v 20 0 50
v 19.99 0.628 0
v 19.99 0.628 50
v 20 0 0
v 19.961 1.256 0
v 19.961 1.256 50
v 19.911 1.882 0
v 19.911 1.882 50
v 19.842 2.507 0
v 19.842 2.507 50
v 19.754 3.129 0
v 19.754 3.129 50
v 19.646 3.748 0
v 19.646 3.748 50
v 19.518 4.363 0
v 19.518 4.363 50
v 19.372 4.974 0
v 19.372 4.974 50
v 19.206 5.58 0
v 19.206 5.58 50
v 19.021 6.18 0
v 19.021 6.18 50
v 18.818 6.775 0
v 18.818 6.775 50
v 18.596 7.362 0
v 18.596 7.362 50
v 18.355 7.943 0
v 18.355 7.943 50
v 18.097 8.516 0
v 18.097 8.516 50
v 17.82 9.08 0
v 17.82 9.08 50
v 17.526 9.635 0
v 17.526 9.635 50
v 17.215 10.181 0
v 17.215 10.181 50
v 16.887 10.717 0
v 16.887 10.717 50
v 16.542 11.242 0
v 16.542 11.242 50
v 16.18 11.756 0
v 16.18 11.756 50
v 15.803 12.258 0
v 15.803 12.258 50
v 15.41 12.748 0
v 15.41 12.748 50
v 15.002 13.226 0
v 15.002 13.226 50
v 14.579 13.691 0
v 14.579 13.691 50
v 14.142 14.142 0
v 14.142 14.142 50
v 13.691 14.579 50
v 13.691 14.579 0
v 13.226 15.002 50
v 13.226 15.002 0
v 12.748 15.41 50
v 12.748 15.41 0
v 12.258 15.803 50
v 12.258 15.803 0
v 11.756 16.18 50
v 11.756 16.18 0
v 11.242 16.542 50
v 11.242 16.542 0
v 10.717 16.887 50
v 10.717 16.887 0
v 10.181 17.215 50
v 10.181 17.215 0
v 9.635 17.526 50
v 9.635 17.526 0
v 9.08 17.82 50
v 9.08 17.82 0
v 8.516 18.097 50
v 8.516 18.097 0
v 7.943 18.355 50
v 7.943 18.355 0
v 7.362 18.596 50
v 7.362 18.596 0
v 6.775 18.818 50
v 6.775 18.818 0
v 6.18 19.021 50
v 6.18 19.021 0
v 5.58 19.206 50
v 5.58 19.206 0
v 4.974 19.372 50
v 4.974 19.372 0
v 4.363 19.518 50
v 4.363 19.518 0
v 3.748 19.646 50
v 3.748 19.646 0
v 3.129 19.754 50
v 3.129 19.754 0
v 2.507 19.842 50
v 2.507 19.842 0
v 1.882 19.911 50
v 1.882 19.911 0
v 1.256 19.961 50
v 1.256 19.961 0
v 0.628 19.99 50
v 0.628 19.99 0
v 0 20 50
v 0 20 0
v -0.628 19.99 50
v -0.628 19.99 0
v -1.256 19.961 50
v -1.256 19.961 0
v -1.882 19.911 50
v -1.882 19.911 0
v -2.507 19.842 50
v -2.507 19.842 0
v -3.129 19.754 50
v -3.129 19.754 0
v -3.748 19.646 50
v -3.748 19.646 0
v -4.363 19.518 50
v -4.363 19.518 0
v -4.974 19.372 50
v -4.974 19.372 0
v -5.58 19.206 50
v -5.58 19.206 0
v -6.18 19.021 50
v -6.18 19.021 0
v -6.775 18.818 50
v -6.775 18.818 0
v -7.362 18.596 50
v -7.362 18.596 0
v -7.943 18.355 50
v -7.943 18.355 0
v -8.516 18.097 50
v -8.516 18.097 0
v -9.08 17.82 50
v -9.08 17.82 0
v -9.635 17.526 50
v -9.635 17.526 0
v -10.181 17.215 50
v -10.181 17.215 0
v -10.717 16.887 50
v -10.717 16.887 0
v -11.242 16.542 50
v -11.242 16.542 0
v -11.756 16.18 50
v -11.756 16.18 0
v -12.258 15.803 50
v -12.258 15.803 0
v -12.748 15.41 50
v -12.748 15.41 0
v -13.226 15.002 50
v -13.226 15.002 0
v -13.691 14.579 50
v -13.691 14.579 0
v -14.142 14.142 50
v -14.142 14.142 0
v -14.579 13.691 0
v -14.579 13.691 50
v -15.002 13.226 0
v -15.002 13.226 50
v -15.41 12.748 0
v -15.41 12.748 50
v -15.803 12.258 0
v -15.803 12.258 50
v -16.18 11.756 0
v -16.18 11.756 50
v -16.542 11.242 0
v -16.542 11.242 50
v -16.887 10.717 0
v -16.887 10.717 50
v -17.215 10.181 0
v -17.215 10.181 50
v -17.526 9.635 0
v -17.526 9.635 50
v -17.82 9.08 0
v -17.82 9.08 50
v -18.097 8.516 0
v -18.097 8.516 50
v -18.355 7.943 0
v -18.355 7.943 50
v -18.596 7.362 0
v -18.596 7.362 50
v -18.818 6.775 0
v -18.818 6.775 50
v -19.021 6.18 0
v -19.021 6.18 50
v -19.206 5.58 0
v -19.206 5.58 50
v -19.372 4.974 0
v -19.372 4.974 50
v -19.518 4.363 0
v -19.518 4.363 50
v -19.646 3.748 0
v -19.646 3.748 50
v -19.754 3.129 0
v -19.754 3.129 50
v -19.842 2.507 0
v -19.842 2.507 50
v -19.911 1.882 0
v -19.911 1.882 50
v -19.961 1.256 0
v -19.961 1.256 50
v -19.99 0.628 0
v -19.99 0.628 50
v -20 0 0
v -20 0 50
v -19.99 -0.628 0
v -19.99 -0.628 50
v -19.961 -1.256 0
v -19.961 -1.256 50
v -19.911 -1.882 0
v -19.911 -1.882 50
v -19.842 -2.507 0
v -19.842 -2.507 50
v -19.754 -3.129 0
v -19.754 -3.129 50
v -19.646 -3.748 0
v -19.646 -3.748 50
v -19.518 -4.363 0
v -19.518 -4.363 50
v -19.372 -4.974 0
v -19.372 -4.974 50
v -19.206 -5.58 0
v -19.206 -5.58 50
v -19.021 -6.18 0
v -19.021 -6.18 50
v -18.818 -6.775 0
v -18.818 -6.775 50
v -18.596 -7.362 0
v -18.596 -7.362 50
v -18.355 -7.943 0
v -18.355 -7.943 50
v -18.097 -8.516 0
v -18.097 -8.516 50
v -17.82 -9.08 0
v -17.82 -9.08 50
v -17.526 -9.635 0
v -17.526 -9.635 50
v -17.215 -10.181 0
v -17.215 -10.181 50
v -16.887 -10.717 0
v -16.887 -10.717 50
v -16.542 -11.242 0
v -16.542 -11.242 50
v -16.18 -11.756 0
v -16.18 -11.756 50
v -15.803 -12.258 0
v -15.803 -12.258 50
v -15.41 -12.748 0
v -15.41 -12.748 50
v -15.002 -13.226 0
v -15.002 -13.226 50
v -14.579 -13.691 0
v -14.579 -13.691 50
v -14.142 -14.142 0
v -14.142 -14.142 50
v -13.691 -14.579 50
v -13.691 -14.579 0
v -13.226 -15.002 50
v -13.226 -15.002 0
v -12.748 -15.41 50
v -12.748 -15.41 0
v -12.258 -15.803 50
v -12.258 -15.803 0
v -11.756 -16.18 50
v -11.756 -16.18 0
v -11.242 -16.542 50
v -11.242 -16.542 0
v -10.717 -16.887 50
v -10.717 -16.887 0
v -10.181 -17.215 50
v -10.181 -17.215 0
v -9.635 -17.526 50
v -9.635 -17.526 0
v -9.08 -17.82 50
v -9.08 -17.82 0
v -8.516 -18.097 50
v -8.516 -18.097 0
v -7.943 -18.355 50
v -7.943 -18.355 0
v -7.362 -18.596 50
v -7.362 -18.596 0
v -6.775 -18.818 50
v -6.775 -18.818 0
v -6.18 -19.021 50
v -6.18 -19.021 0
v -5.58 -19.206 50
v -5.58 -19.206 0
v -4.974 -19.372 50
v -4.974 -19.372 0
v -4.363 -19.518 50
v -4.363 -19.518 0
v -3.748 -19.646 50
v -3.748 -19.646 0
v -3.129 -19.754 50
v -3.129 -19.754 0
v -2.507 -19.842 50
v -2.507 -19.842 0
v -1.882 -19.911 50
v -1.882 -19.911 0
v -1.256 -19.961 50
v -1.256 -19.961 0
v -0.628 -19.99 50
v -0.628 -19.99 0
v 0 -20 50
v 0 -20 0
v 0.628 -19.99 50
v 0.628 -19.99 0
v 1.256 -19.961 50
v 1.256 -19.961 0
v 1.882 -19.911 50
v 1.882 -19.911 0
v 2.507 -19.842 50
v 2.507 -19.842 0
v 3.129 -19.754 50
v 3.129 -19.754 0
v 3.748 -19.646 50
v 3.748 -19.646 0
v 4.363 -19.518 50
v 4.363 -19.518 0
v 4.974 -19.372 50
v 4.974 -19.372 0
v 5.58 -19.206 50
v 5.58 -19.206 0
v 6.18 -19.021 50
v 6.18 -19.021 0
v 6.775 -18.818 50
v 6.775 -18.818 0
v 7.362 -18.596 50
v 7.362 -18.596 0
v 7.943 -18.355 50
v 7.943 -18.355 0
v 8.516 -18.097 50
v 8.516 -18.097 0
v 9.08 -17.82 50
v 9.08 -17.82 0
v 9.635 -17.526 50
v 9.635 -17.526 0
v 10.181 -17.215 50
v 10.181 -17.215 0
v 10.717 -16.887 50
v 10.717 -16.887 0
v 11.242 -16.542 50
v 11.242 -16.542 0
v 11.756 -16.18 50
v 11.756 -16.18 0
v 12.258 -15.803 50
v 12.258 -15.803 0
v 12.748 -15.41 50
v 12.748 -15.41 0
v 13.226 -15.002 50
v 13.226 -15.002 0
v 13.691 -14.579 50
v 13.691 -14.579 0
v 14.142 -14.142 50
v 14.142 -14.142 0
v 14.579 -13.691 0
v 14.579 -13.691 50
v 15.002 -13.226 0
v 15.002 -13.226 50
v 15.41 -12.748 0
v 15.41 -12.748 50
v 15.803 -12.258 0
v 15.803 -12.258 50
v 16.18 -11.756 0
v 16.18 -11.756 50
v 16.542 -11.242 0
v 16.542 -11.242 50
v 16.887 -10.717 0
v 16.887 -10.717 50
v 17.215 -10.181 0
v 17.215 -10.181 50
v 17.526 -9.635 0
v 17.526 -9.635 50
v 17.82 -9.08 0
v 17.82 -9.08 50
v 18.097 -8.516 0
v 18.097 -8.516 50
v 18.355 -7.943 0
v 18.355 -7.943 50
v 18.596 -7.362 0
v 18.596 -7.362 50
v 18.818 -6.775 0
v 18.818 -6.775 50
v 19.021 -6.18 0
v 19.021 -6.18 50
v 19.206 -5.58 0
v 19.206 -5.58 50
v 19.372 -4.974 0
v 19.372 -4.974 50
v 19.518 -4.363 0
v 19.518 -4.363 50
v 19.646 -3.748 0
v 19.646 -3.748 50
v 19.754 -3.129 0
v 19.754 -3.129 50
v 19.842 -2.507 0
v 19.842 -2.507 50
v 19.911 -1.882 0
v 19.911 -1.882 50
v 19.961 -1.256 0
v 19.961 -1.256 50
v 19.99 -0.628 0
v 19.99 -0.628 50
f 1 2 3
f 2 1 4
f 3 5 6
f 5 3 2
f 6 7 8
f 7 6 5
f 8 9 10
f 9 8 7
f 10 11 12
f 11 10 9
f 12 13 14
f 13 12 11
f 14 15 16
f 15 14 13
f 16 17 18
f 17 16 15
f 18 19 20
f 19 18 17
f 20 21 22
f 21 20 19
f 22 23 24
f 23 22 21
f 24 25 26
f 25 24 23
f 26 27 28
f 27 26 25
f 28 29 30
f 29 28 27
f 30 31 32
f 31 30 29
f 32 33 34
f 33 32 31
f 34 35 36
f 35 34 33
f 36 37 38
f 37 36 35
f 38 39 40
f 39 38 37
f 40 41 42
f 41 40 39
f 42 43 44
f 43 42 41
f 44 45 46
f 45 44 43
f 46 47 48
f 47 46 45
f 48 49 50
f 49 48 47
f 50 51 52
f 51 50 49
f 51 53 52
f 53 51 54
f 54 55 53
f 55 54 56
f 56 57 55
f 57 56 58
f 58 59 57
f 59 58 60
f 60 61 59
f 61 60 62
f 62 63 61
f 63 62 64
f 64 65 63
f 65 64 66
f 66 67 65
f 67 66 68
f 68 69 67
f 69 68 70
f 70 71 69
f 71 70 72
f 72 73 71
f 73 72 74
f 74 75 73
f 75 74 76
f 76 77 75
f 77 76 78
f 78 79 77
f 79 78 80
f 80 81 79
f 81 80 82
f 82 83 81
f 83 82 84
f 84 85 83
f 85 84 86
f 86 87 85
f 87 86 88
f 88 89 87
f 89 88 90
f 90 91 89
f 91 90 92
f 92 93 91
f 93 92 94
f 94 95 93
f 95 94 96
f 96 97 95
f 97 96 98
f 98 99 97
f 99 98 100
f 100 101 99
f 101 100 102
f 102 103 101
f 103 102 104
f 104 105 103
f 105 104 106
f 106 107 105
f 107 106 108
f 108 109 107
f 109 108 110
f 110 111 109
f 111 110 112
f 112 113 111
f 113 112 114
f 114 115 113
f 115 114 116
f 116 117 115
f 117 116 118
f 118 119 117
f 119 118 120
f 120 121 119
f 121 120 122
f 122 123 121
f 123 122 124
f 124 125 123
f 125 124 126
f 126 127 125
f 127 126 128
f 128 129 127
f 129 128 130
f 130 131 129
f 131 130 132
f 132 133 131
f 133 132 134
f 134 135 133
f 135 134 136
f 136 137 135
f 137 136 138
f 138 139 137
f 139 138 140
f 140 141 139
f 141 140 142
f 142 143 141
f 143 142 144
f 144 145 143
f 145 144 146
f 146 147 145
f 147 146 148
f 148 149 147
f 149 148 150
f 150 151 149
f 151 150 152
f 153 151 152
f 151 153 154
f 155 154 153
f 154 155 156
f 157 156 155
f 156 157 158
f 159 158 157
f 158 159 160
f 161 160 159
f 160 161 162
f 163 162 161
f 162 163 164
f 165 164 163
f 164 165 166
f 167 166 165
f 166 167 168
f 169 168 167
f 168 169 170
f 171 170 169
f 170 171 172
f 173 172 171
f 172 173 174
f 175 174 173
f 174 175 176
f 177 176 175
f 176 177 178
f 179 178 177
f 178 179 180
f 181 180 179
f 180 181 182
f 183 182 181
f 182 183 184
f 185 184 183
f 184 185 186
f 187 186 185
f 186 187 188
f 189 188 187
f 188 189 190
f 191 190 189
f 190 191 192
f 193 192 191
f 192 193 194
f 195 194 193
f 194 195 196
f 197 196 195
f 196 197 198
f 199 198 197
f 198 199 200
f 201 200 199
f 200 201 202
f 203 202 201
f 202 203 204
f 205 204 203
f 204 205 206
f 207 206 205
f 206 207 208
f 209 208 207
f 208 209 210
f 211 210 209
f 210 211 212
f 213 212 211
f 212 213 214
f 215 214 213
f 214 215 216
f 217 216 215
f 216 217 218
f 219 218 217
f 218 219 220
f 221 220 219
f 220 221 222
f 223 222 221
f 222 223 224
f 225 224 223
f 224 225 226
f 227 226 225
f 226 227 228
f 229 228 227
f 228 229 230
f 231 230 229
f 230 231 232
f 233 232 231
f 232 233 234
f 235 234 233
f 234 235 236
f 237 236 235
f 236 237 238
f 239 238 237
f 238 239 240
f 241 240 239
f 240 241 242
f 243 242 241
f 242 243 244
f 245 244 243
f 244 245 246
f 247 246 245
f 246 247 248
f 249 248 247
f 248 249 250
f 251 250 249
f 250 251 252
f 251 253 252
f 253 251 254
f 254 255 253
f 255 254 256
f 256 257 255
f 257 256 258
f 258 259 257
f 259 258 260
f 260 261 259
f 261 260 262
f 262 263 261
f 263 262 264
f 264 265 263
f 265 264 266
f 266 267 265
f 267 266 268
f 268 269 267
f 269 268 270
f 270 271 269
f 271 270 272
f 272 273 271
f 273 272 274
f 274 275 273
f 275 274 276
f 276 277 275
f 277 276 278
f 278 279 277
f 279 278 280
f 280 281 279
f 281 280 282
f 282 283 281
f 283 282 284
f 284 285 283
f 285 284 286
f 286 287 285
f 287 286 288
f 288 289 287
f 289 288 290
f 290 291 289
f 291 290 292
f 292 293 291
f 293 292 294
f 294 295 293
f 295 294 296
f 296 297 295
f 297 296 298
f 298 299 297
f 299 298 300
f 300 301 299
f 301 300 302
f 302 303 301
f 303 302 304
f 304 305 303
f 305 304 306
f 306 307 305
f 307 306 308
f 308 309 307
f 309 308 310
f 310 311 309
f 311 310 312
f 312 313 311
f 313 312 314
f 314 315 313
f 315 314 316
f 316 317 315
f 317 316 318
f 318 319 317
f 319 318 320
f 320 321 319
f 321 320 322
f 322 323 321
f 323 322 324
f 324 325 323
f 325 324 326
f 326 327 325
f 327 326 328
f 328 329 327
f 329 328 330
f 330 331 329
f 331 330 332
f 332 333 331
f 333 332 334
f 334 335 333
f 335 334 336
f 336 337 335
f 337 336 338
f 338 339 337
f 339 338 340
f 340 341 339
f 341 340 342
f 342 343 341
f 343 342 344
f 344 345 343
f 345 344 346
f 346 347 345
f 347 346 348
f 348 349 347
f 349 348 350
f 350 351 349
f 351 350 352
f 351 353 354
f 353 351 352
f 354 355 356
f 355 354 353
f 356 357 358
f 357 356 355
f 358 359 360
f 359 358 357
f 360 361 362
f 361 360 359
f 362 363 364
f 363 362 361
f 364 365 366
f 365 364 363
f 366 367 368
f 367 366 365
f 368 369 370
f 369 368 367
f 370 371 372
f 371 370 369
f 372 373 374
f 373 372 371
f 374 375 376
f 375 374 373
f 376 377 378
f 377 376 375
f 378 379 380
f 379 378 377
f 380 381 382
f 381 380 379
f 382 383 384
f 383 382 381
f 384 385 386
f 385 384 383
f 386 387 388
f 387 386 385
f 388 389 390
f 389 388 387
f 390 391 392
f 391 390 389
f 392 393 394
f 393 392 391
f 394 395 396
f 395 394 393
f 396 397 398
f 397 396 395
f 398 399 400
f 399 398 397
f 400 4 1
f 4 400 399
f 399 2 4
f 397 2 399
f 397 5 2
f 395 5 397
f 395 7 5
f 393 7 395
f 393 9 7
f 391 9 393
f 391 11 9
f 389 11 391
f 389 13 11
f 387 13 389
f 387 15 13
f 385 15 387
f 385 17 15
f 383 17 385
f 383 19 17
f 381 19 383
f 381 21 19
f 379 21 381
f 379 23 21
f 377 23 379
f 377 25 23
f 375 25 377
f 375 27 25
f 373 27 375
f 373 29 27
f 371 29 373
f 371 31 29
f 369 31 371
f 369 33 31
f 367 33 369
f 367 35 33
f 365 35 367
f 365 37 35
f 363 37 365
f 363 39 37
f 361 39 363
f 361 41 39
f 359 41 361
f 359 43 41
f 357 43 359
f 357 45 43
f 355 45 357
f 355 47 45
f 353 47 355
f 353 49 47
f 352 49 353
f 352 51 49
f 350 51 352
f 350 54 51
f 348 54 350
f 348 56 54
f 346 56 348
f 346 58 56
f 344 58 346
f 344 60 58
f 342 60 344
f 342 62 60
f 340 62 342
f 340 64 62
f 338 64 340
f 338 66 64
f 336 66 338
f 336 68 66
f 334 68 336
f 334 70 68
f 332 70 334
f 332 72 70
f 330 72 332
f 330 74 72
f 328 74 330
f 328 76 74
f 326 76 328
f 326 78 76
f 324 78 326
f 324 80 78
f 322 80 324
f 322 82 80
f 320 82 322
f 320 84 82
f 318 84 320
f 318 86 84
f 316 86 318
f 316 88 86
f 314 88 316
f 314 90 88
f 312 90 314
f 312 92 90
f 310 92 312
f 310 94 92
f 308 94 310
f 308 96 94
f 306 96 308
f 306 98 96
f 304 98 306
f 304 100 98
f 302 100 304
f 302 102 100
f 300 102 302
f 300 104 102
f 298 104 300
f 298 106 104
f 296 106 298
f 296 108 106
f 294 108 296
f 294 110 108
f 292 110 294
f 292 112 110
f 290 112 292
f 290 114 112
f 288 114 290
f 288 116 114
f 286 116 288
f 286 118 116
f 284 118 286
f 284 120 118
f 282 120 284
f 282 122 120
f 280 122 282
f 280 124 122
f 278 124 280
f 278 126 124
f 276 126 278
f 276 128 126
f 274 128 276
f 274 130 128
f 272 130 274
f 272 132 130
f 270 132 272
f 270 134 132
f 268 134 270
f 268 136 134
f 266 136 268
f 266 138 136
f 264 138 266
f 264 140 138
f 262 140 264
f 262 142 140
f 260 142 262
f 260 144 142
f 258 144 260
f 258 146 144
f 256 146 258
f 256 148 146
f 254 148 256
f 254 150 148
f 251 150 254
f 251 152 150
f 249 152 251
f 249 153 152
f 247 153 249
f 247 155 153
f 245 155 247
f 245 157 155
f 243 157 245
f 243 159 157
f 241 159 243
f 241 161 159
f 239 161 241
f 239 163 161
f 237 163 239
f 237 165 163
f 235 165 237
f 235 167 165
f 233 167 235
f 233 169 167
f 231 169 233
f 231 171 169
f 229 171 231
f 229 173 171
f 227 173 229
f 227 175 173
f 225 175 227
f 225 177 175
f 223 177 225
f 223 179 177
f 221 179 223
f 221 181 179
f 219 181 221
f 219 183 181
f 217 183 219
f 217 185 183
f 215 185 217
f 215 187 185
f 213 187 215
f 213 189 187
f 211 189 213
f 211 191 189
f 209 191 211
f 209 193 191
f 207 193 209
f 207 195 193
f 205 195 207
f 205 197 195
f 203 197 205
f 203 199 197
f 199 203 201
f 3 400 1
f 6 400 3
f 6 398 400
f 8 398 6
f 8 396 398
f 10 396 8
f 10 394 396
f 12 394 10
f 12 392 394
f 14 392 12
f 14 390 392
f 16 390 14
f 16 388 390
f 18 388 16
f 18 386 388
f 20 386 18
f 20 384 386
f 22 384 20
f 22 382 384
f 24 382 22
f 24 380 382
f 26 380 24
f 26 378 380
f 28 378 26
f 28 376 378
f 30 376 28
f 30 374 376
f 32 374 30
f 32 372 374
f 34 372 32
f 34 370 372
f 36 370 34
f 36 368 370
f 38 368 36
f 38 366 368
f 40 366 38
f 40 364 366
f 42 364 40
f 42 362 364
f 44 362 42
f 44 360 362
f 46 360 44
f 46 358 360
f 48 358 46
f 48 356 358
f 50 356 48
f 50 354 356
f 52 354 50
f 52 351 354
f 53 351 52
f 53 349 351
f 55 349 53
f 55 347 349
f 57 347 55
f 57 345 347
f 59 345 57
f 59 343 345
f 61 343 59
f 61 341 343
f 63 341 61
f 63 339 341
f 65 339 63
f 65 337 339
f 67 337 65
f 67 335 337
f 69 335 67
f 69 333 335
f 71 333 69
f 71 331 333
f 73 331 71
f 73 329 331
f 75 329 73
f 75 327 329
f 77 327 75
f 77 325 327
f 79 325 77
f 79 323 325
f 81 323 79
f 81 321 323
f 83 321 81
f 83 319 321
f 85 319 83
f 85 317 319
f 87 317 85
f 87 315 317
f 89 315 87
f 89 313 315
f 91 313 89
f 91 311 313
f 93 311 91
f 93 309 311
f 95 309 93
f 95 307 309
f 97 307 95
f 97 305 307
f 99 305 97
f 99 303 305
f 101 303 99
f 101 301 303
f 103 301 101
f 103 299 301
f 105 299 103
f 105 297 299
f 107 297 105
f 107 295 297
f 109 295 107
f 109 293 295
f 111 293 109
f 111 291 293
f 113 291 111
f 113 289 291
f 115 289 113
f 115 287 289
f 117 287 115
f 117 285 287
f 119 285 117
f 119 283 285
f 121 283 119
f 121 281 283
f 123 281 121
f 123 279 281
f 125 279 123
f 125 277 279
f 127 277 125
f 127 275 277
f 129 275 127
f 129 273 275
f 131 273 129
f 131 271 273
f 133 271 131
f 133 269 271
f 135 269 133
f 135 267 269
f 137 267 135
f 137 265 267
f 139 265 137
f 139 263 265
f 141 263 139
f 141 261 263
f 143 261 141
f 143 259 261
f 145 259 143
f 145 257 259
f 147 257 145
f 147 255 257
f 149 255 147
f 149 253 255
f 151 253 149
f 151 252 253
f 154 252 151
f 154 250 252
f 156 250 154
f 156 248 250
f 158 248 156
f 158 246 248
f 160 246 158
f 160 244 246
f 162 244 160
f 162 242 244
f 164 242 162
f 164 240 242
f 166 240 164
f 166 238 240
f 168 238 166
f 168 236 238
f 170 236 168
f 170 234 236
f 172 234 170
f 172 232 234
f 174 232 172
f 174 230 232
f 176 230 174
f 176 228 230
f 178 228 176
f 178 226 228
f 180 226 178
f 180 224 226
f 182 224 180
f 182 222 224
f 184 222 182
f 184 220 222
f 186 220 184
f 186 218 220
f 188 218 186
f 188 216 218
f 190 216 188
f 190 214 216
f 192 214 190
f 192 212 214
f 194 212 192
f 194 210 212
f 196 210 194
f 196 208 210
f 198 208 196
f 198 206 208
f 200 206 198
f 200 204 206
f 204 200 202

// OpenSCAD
// Basic_Shape_02.scad
// Rectangular Solid

// cylinder(h=50, r=20);
// width = 50
// depth = 30 (length)
// height = 10
cylinder(h=50, r=20, $fn=200);
